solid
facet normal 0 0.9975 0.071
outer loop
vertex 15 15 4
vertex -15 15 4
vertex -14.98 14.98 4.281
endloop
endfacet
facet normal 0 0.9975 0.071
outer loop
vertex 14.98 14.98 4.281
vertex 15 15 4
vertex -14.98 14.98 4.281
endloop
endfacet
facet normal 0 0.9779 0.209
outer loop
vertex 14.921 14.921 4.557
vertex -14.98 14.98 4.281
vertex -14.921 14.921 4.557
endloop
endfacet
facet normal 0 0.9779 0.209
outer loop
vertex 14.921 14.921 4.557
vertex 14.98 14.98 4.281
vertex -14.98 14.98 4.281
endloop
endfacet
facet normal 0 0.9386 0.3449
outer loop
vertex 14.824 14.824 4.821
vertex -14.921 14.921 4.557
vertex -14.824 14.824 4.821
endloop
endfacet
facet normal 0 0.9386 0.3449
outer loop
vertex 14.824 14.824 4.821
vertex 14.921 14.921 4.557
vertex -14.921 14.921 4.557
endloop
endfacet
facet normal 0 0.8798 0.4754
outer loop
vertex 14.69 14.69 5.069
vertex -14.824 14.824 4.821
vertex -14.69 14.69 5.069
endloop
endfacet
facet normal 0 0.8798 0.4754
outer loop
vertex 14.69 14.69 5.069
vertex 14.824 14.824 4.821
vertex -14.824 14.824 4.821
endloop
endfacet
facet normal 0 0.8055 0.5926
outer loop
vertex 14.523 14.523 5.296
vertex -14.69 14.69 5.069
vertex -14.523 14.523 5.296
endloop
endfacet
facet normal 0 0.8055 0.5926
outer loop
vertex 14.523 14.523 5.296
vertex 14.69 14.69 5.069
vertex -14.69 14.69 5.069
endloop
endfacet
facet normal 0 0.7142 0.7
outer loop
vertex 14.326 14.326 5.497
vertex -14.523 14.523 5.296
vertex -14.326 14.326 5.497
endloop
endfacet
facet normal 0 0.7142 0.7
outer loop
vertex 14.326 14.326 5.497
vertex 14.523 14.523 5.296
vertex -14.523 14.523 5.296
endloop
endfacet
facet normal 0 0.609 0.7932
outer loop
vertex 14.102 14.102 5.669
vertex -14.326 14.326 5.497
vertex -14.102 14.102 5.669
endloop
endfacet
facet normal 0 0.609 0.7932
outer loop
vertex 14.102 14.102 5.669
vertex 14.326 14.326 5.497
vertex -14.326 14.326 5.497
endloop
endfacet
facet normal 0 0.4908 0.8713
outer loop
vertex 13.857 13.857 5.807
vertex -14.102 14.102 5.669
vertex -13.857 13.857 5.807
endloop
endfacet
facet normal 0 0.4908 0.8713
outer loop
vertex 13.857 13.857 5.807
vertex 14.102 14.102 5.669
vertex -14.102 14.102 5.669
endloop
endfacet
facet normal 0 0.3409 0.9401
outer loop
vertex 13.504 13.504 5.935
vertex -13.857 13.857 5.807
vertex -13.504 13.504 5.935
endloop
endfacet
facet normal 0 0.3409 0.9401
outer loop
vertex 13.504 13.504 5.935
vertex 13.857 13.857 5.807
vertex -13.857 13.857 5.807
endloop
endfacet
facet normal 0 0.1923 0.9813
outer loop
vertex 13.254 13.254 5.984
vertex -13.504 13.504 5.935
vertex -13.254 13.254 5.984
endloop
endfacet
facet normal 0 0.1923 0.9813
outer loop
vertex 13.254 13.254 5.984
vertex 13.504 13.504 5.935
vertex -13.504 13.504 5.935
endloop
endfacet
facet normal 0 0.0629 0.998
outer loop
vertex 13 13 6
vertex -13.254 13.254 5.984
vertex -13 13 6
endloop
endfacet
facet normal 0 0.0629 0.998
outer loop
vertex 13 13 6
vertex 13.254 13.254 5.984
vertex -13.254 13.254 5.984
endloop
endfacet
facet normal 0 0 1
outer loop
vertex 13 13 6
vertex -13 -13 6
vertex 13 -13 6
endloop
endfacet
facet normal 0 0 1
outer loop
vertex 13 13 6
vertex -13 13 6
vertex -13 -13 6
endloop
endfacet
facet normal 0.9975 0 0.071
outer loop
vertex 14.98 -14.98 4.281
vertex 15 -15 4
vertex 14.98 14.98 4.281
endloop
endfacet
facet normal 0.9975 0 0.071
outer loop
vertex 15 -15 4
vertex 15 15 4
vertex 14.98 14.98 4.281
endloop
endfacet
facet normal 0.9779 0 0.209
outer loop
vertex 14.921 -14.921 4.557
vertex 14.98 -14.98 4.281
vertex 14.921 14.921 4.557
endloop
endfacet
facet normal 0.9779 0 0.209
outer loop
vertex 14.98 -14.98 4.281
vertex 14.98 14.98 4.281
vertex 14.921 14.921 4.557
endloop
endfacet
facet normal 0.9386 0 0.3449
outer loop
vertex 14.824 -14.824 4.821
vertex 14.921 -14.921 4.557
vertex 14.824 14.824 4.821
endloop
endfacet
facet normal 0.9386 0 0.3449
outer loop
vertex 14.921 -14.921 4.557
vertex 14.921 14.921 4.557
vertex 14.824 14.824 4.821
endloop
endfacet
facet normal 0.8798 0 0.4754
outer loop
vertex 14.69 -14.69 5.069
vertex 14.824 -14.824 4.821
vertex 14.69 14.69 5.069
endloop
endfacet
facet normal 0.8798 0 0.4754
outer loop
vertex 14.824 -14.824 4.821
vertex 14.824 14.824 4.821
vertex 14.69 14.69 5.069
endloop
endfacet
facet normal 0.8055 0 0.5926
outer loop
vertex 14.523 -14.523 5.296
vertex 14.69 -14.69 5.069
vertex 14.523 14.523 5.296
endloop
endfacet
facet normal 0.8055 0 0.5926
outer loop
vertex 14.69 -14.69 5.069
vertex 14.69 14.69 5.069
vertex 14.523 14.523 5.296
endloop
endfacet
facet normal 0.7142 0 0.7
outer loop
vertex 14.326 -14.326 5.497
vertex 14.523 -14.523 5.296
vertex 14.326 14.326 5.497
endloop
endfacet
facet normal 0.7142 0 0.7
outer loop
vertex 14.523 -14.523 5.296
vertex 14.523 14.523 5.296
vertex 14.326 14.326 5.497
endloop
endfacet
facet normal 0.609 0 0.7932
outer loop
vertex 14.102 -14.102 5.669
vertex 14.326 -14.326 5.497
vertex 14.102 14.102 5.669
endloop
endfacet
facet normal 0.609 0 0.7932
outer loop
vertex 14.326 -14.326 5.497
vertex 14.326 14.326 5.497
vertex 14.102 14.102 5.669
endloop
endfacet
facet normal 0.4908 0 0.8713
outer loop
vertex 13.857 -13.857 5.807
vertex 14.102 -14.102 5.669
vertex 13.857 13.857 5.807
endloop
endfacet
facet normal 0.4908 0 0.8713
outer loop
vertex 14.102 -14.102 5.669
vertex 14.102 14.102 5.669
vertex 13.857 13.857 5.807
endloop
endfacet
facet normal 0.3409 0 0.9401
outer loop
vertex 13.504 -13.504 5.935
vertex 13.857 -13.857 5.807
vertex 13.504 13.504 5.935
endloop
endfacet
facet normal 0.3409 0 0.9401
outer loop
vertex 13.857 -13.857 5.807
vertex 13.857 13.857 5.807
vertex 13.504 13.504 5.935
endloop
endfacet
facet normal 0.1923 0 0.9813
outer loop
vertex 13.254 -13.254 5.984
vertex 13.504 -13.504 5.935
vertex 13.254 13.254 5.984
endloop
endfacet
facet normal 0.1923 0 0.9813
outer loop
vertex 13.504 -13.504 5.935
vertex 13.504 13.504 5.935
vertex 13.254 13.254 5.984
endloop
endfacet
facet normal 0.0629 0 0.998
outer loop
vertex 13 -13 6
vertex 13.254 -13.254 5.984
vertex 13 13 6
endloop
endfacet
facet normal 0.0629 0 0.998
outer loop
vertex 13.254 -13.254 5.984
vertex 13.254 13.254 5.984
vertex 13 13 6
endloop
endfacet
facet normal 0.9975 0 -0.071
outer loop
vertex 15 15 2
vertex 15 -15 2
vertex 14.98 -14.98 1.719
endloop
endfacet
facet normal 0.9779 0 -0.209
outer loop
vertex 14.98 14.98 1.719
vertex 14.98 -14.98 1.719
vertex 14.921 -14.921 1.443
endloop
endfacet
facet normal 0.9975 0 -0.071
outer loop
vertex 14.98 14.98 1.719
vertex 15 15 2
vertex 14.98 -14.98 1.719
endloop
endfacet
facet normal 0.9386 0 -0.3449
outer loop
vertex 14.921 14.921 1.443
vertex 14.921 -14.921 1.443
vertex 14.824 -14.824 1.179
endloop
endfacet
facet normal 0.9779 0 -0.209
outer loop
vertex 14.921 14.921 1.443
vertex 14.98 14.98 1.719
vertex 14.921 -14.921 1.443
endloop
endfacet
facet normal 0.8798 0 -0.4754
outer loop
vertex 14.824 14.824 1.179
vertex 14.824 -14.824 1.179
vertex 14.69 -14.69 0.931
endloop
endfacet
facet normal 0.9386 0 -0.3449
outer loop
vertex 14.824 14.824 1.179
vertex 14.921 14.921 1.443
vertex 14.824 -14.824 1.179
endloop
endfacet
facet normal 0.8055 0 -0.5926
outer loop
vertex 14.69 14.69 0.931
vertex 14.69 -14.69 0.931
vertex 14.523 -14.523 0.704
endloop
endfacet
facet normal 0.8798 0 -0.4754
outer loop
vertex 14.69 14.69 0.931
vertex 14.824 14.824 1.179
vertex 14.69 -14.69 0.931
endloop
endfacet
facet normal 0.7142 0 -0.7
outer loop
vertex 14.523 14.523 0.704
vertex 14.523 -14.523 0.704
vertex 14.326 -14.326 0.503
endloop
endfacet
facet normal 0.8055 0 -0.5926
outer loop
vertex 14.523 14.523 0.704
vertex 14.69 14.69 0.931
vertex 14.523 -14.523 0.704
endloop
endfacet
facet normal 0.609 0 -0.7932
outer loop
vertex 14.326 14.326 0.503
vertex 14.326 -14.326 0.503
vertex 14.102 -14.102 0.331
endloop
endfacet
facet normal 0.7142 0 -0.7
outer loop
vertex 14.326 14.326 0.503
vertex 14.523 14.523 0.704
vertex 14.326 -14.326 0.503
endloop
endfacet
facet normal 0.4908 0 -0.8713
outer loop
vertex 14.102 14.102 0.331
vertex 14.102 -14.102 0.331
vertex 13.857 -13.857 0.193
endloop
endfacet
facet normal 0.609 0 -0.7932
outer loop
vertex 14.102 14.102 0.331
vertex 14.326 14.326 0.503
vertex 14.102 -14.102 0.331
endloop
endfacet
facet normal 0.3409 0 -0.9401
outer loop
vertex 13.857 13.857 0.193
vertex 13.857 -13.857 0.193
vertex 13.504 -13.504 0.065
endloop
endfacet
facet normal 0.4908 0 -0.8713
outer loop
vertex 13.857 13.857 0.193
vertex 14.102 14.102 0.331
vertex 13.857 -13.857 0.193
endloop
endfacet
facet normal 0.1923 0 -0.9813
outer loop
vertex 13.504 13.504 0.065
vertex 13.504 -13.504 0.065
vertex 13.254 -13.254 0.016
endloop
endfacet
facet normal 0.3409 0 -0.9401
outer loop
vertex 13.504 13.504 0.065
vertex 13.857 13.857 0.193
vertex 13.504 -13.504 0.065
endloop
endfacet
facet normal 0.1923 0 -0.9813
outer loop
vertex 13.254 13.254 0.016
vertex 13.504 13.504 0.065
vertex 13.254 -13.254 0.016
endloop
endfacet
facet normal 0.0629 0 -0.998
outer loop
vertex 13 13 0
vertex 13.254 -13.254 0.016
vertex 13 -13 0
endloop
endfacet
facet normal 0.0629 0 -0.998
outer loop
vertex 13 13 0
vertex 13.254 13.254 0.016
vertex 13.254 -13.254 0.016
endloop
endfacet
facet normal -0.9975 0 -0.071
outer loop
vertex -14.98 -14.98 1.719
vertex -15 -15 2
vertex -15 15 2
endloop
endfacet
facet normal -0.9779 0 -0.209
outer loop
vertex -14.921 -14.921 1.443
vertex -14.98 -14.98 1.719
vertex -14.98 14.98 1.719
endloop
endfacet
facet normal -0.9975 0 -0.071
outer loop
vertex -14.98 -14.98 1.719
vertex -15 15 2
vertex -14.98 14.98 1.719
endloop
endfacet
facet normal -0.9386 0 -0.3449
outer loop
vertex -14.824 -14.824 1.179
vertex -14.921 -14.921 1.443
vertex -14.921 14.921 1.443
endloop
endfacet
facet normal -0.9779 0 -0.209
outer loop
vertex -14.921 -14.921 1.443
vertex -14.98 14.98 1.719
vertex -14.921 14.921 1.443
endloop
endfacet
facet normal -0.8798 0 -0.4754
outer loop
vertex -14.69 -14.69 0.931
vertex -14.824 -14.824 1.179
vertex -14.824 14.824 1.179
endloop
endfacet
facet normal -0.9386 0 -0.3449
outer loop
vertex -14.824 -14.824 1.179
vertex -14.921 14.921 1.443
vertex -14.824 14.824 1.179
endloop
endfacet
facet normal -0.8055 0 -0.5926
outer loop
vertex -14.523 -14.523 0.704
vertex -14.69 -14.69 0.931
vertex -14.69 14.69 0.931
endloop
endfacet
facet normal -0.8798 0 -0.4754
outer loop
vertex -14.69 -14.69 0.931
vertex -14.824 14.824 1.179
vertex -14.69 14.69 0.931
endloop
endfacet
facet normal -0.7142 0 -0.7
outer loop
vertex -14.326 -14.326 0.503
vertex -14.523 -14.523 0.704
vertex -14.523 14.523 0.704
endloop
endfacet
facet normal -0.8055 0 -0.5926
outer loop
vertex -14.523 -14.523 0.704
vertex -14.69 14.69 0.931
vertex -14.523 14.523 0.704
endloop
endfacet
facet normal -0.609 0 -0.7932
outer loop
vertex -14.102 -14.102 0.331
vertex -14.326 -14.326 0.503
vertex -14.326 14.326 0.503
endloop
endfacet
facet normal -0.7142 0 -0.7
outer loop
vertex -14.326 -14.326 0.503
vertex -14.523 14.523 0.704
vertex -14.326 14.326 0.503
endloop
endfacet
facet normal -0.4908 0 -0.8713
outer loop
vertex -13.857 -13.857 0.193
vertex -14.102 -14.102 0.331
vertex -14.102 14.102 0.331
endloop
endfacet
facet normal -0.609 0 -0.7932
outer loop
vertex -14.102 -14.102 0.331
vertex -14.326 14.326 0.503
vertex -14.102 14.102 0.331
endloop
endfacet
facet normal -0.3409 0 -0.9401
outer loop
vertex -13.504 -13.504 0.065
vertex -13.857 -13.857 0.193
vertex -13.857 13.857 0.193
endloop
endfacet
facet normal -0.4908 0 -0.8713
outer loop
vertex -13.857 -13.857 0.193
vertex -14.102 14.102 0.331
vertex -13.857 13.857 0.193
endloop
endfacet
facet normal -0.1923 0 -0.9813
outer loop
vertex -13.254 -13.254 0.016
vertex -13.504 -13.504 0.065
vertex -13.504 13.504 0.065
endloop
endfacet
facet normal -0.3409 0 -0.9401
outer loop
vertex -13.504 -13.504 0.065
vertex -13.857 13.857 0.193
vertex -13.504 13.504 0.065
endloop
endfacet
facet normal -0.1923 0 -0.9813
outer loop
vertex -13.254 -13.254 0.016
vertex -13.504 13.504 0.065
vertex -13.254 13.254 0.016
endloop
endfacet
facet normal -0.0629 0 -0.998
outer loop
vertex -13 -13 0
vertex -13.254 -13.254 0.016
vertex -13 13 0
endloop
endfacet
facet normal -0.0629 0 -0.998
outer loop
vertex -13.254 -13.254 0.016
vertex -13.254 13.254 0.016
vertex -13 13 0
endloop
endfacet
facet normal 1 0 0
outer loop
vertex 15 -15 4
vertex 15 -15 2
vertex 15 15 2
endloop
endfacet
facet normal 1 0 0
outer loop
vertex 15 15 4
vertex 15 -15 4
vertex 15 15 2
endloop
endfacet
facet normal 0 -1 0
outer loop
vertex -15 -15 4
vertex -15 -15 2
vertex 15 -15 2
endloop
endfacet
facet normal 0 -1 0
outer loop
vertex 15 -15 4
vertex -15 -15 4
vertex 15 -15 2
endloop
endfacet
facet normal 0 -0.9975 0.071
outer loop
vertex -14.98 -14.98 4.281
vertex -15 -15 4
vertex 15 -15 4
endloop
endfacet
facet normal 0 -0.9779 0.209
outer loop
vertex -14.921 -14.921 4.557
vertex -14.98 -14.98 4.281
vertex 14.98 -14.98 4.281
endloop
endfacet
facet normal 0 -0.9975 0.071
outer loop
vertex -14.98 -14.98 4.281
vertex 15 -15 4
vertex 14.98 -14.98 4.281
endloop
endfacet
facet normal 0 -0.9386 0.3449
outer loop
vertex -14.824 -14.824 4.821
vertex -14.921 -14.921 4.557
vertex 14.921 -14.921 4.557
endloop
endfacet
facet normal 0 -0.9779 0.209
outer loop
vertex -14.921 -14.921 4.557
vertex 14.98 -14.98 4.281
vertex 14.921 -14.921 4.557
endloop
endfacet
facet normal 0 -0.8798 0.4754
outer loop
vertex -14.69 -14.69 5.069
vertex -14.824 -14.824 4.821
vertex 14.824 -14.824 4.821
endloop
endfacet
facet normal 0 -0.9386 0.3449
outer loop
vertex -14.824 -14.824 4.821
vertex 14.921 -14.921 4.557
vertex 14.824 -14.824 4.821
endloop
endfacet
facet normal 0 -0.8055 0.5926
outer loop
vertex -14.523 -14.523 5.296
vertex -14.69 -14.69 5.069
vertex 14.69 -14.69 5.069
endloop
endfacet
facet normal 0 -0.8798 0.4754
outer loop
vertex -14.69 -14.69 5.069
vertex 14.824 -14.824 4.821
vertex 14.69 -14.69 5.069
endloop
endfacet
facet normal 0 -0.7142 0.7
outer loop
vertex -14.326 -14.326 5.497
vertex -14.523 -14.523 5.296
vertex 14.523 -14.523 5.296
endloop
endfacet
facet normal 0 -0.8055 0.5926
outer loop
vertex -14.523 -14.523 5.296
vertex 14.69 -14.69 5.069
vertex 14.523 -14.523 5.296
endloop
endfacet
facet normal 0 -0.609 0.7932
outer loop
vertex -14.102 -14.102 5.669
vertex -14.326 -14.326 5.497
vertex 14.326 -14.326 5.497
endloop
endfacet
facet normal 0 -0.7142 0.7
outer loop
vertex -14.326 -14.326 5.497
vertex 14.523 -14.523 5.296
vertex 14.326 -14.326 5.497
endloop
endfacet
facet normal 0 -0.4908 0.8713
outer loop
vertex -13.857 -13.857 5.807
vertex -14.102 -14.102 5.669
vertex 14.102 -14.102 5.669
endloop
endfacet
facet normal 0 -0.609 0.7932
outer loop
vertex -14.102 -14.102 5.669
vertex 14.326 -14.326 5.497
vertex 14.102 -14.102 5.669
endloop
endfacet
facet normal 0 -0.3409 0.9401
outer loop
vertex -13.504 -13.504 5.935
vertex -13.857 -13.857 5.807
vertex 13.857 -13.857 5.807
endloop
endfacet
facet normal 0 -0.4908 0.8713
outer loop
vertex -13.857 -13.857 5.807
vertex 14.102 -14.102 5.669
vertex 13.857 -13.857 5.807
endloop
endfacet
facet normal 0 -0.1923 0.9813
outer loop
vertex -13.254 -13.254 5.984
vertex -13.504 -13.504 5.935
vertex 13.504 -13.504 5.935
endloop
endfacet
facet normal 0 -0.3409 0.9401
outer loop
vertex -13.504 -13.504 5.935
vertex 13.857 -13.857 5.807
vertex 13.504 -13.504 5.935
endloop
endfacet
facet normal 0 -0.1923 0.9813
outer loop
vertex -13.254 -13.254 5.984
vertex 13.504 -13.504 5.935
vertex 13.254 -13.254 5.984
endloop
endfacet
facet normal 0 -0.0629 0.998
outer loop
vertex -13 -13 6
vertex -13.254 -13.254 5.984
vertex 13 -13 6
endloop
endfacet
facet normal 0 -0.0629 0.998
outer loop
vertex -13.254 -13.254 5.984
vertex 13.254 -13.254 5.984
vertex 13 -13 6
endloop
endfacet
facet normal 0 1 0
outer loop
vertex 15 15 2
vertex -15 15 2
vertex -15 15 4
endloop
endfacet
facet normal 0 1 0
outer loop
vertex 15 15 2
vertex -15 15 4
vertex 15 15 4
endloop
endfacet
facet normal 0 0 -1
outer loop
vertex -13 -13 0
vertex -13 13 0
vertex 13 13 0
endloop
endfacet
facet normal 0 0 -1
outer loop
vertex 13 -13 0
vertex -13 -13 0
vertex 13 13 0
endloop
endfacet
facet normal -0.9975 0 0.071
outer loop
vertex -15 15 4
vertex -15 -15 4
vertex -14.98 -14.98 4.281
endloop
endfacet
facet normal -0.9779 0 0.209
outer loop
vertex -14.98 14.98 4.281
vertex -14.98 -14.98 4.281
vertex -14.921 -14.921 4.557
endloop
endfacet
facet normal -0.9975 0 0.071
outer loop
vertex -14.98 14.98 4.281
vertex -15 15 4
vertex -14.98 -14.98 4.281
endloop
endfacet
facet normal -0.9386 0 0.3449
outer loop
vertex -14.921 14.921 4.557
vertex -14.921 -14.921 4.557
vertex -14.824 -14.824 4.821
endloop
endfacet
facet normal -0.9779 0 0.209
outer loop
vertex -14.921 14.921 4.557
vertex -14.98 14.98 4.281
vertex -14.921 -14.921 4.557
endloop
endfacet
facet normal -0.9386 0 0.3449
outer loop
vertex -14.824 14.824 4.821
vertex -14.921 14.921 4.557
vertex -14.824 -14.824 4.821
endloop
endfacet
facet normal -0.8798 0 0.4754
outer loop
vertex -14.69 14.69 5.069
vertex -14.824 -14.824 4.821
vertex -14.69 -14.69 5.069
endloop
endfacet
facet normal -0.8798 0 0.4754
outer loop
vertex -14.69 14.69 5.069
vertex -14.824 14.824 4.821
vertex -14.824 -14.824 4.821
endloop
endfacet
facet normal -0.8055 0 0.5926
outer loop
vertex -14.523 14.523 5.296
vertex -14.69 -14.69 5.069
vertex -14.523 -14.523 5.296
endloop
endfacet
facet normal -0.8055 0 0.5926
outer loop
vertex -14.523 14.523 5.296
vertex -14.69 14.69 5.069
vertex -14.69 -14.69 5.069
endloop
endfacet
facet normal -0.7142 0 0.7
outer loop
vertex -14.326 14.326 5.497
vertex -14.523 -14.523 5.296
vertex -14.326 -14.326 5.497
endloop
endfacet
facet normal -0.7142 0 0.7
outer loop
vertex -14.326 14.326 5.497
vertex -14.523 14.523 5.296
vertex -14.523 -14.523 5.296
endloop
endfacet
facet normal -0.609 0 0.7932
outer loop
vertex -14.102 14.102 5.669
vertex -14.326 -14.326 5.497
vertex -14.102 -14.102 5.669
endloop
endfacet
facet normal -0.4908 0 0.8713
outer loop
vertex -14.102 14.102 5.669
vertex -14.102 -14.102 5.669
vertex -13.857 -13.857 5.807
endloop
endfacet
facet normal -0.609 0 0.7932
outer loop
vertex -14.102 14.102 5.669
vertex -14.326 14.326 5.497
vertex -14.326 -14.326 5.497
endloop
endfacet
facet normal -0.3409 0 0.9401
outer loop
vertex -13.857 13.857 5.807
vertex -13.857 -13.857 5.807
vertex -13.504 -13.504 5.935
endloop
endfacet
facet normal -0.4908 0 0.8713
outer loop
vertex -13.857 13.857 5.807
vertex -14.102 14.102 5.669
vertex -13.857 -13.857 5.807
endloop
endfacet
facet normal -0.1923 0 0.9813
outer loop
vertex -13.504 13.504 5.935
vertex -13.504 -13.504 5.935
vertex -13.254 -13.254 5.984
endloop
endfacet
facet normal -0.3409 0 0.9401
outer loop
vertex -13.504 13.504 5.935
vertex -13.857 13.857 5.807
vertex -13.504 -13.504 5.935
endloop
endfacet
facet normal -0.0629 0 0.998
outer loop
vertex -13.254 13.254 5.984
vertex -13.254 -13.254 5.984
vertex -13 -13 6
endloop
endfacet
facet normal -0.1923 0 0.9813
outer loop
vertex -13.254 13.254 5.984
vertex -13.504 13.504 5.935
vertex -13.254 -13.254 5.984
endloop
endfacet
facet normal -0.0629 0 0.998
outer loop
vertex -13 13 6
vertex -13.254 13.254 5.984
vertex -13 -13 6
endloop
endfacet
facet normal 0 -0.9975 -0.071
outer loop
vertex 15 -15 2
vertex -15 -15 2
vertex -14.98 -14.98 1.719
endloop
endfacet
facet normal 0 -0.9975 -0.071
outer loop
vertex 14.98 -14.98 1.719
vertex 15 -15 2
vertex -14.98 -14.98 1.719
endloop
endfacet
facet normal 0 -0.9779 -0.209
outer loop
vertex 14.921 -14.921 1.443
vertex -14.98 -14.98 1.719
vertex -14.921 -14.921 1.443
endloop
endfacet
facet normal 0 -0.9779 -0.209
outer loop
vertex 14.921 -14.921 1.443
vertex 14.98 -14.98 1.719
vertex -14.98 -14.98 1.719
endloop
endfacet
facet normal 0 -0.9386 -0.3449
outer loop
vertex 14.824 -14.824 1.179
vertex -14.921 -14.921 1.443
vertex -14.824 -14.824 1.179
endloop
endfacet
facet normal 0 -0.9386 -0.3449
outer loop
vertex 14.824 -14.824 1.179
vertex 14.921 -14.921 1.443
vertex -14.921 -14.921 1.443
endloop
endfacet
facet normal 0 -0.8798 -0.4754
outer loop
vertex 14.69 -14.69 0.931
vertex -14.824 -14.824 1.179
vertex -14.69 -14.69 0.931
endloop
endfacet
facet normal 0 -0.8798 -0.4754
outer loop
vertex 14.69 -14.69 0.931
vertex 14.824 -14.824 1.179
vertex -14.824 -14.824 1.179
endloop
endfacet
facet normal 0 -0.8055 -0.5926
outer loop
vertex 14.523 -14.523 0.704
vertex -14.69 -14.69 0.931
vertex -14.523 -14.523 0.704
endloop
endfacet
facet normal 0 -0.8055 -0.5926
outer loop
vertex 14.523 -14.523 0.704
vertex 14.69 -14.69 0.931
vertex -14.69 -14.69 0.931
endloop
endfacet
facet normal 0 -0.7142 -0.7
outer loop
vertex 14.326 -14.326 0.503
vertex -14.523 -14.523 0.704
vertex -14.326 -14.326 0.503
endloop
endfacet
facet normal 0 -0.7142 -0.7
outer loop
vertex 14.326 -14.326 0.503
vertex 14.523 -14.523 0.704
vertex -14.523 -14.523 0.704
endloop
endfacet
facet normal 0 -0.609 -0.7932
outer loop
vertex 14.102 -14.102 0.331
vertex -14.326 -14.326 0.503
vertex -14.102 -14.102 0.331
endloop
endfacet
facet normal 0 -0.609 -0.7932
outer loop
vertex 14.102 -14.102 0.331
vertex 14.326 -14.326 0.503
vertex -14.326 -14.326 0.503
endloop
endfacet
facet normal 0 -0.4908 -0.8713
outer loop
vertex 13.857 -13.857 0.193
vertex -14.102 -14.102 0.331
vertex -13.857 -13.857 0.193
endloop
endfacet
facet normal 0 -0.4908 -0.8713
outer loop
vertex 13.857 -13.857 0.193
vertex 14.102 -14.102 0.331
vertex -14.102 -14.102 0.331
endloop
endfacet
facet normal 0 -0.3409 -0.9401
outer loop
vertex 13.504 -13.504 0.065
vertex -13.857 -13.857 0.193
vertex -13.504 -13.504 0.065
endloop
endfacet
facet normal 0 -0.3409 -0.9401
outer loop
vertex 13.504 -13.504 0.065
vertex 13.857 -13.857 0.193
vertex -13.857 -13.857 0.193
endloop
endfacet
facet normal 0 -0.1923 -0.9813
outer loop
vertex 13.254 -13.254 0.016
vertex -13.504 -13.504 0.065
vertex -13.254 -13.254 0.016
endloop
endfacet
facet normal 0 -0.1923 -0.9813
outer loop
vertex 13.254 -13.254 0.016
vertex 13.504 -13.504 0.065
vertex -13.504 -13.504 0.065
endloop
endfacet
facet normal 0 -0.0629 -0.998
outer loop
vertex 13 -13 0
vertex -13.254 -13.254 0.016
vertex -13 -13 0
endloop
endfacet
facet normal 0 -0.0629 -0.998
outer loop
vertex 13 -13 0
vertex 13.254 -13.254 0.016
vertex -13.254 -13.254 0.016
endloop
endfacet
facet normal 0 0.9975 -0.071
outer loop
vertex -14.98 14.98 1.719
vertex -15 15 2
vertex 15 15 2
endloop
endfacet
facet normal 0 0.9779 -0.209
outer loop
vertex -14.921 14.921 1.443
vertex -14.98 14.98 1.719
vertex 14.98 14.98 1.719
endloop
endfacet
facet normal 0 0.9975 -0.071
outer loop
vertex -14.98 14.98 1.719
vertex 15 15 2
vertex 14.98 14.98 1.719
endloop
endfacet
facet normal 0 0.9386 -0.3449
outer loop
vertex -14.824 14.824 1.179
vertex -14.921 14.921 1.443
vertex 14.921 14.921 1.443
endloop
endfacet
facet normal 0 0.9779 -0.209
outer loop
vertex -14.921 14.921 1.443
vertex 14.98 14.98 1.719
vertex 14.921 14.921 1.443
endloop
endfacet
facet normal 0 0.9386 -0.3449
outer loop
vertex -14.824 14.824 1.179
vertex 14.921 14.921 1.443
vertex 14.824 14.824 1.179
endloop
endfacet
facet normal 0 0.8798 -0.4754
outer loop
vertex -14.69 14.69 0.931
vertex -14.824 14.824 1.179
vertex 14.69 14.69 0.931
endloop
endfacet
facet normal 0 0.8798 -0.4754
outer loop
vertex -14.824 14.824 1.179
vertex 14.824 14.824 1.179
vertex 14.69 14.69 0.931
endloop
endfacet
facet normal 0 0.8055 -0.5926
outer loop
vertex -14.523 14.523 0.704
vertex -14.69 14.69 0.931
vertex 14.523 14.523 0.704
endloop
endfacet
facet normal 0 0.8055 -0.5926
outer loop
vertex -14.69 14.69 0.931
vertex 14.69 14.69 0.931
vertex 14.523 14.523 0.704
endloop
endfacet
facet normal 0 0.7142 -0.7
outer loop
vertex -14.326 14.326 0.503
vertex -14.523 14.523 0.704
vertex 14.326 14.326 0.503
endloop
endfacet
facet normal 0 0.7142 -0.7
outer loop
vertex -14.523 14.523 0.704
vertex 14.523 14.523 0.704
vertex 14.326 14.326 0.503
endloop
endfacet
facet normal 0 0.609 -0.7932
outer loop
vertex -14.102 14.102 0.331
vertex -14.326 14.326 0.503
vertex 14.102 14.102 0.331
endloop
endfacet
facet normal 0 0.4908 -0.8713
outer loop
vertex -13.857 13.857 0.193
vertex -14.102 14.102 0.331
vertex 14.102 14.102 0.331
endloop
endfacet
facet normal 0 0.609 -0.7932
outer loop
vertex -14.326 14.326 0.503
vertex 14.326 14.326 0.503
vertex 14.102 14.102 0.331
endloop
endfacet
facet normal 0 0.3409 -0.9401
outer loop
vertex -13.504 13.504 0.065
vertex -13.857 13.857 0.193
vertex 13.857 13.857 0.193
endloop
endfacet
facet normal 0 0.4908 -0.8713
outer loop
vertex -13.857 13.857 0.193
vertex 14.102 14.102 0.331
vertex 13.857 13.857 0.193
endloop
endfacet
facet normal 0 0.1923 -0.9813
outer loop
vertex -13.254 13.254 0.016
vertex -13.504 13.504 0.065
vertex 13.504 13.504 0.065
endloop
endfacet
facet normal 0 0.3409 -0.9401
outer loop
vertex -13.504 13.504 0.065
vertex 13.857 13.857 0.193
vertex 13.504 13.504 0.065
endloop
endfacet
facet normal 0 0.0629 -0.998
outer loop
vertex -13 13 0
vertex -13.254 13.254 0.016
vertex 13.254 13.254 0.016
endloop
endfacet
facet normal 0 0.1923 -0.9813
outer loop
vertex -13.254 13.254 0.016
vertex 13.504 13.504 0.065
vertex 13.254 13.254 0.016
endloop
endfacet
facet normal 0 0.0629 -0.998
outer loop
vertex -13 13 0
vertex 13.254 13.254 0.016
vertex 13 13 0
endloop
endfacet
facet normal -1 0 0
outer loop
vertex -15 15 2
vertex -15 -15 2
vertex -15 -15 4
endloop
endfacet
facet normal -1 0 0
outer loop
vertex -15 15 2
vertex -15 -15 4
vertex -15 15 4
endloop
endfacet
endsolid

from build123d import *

# Parameters (mm, degrees)
SKETCH_W  = 30
SKETCH_H  = 30
PAD_DEPTH = 6
FILLET_R  = 2


with BuildPart() as part:
    # Sketch → Pad (new body)
    with BuildSketch(Plane.XY):
        Rectangle(SKETCH_W, SKETCH_H)
    extrude(amount=PAD_DEPTH)

    # Fillet
    fillet_edges = [part.edges().sort_by_distance(p)[0] for p in [
        (0, -15, 6),
        (-15, 0, 6),
        (0, 15, 6),
        (15, 0, 6),
        (-15, 0, 0),
        (0, -15, 0),
        (0, 15, 0),
        (15, 0, 0),
    ]]
    fillet(fillet_edges, radius=FILLET_R)


solid = part.part
